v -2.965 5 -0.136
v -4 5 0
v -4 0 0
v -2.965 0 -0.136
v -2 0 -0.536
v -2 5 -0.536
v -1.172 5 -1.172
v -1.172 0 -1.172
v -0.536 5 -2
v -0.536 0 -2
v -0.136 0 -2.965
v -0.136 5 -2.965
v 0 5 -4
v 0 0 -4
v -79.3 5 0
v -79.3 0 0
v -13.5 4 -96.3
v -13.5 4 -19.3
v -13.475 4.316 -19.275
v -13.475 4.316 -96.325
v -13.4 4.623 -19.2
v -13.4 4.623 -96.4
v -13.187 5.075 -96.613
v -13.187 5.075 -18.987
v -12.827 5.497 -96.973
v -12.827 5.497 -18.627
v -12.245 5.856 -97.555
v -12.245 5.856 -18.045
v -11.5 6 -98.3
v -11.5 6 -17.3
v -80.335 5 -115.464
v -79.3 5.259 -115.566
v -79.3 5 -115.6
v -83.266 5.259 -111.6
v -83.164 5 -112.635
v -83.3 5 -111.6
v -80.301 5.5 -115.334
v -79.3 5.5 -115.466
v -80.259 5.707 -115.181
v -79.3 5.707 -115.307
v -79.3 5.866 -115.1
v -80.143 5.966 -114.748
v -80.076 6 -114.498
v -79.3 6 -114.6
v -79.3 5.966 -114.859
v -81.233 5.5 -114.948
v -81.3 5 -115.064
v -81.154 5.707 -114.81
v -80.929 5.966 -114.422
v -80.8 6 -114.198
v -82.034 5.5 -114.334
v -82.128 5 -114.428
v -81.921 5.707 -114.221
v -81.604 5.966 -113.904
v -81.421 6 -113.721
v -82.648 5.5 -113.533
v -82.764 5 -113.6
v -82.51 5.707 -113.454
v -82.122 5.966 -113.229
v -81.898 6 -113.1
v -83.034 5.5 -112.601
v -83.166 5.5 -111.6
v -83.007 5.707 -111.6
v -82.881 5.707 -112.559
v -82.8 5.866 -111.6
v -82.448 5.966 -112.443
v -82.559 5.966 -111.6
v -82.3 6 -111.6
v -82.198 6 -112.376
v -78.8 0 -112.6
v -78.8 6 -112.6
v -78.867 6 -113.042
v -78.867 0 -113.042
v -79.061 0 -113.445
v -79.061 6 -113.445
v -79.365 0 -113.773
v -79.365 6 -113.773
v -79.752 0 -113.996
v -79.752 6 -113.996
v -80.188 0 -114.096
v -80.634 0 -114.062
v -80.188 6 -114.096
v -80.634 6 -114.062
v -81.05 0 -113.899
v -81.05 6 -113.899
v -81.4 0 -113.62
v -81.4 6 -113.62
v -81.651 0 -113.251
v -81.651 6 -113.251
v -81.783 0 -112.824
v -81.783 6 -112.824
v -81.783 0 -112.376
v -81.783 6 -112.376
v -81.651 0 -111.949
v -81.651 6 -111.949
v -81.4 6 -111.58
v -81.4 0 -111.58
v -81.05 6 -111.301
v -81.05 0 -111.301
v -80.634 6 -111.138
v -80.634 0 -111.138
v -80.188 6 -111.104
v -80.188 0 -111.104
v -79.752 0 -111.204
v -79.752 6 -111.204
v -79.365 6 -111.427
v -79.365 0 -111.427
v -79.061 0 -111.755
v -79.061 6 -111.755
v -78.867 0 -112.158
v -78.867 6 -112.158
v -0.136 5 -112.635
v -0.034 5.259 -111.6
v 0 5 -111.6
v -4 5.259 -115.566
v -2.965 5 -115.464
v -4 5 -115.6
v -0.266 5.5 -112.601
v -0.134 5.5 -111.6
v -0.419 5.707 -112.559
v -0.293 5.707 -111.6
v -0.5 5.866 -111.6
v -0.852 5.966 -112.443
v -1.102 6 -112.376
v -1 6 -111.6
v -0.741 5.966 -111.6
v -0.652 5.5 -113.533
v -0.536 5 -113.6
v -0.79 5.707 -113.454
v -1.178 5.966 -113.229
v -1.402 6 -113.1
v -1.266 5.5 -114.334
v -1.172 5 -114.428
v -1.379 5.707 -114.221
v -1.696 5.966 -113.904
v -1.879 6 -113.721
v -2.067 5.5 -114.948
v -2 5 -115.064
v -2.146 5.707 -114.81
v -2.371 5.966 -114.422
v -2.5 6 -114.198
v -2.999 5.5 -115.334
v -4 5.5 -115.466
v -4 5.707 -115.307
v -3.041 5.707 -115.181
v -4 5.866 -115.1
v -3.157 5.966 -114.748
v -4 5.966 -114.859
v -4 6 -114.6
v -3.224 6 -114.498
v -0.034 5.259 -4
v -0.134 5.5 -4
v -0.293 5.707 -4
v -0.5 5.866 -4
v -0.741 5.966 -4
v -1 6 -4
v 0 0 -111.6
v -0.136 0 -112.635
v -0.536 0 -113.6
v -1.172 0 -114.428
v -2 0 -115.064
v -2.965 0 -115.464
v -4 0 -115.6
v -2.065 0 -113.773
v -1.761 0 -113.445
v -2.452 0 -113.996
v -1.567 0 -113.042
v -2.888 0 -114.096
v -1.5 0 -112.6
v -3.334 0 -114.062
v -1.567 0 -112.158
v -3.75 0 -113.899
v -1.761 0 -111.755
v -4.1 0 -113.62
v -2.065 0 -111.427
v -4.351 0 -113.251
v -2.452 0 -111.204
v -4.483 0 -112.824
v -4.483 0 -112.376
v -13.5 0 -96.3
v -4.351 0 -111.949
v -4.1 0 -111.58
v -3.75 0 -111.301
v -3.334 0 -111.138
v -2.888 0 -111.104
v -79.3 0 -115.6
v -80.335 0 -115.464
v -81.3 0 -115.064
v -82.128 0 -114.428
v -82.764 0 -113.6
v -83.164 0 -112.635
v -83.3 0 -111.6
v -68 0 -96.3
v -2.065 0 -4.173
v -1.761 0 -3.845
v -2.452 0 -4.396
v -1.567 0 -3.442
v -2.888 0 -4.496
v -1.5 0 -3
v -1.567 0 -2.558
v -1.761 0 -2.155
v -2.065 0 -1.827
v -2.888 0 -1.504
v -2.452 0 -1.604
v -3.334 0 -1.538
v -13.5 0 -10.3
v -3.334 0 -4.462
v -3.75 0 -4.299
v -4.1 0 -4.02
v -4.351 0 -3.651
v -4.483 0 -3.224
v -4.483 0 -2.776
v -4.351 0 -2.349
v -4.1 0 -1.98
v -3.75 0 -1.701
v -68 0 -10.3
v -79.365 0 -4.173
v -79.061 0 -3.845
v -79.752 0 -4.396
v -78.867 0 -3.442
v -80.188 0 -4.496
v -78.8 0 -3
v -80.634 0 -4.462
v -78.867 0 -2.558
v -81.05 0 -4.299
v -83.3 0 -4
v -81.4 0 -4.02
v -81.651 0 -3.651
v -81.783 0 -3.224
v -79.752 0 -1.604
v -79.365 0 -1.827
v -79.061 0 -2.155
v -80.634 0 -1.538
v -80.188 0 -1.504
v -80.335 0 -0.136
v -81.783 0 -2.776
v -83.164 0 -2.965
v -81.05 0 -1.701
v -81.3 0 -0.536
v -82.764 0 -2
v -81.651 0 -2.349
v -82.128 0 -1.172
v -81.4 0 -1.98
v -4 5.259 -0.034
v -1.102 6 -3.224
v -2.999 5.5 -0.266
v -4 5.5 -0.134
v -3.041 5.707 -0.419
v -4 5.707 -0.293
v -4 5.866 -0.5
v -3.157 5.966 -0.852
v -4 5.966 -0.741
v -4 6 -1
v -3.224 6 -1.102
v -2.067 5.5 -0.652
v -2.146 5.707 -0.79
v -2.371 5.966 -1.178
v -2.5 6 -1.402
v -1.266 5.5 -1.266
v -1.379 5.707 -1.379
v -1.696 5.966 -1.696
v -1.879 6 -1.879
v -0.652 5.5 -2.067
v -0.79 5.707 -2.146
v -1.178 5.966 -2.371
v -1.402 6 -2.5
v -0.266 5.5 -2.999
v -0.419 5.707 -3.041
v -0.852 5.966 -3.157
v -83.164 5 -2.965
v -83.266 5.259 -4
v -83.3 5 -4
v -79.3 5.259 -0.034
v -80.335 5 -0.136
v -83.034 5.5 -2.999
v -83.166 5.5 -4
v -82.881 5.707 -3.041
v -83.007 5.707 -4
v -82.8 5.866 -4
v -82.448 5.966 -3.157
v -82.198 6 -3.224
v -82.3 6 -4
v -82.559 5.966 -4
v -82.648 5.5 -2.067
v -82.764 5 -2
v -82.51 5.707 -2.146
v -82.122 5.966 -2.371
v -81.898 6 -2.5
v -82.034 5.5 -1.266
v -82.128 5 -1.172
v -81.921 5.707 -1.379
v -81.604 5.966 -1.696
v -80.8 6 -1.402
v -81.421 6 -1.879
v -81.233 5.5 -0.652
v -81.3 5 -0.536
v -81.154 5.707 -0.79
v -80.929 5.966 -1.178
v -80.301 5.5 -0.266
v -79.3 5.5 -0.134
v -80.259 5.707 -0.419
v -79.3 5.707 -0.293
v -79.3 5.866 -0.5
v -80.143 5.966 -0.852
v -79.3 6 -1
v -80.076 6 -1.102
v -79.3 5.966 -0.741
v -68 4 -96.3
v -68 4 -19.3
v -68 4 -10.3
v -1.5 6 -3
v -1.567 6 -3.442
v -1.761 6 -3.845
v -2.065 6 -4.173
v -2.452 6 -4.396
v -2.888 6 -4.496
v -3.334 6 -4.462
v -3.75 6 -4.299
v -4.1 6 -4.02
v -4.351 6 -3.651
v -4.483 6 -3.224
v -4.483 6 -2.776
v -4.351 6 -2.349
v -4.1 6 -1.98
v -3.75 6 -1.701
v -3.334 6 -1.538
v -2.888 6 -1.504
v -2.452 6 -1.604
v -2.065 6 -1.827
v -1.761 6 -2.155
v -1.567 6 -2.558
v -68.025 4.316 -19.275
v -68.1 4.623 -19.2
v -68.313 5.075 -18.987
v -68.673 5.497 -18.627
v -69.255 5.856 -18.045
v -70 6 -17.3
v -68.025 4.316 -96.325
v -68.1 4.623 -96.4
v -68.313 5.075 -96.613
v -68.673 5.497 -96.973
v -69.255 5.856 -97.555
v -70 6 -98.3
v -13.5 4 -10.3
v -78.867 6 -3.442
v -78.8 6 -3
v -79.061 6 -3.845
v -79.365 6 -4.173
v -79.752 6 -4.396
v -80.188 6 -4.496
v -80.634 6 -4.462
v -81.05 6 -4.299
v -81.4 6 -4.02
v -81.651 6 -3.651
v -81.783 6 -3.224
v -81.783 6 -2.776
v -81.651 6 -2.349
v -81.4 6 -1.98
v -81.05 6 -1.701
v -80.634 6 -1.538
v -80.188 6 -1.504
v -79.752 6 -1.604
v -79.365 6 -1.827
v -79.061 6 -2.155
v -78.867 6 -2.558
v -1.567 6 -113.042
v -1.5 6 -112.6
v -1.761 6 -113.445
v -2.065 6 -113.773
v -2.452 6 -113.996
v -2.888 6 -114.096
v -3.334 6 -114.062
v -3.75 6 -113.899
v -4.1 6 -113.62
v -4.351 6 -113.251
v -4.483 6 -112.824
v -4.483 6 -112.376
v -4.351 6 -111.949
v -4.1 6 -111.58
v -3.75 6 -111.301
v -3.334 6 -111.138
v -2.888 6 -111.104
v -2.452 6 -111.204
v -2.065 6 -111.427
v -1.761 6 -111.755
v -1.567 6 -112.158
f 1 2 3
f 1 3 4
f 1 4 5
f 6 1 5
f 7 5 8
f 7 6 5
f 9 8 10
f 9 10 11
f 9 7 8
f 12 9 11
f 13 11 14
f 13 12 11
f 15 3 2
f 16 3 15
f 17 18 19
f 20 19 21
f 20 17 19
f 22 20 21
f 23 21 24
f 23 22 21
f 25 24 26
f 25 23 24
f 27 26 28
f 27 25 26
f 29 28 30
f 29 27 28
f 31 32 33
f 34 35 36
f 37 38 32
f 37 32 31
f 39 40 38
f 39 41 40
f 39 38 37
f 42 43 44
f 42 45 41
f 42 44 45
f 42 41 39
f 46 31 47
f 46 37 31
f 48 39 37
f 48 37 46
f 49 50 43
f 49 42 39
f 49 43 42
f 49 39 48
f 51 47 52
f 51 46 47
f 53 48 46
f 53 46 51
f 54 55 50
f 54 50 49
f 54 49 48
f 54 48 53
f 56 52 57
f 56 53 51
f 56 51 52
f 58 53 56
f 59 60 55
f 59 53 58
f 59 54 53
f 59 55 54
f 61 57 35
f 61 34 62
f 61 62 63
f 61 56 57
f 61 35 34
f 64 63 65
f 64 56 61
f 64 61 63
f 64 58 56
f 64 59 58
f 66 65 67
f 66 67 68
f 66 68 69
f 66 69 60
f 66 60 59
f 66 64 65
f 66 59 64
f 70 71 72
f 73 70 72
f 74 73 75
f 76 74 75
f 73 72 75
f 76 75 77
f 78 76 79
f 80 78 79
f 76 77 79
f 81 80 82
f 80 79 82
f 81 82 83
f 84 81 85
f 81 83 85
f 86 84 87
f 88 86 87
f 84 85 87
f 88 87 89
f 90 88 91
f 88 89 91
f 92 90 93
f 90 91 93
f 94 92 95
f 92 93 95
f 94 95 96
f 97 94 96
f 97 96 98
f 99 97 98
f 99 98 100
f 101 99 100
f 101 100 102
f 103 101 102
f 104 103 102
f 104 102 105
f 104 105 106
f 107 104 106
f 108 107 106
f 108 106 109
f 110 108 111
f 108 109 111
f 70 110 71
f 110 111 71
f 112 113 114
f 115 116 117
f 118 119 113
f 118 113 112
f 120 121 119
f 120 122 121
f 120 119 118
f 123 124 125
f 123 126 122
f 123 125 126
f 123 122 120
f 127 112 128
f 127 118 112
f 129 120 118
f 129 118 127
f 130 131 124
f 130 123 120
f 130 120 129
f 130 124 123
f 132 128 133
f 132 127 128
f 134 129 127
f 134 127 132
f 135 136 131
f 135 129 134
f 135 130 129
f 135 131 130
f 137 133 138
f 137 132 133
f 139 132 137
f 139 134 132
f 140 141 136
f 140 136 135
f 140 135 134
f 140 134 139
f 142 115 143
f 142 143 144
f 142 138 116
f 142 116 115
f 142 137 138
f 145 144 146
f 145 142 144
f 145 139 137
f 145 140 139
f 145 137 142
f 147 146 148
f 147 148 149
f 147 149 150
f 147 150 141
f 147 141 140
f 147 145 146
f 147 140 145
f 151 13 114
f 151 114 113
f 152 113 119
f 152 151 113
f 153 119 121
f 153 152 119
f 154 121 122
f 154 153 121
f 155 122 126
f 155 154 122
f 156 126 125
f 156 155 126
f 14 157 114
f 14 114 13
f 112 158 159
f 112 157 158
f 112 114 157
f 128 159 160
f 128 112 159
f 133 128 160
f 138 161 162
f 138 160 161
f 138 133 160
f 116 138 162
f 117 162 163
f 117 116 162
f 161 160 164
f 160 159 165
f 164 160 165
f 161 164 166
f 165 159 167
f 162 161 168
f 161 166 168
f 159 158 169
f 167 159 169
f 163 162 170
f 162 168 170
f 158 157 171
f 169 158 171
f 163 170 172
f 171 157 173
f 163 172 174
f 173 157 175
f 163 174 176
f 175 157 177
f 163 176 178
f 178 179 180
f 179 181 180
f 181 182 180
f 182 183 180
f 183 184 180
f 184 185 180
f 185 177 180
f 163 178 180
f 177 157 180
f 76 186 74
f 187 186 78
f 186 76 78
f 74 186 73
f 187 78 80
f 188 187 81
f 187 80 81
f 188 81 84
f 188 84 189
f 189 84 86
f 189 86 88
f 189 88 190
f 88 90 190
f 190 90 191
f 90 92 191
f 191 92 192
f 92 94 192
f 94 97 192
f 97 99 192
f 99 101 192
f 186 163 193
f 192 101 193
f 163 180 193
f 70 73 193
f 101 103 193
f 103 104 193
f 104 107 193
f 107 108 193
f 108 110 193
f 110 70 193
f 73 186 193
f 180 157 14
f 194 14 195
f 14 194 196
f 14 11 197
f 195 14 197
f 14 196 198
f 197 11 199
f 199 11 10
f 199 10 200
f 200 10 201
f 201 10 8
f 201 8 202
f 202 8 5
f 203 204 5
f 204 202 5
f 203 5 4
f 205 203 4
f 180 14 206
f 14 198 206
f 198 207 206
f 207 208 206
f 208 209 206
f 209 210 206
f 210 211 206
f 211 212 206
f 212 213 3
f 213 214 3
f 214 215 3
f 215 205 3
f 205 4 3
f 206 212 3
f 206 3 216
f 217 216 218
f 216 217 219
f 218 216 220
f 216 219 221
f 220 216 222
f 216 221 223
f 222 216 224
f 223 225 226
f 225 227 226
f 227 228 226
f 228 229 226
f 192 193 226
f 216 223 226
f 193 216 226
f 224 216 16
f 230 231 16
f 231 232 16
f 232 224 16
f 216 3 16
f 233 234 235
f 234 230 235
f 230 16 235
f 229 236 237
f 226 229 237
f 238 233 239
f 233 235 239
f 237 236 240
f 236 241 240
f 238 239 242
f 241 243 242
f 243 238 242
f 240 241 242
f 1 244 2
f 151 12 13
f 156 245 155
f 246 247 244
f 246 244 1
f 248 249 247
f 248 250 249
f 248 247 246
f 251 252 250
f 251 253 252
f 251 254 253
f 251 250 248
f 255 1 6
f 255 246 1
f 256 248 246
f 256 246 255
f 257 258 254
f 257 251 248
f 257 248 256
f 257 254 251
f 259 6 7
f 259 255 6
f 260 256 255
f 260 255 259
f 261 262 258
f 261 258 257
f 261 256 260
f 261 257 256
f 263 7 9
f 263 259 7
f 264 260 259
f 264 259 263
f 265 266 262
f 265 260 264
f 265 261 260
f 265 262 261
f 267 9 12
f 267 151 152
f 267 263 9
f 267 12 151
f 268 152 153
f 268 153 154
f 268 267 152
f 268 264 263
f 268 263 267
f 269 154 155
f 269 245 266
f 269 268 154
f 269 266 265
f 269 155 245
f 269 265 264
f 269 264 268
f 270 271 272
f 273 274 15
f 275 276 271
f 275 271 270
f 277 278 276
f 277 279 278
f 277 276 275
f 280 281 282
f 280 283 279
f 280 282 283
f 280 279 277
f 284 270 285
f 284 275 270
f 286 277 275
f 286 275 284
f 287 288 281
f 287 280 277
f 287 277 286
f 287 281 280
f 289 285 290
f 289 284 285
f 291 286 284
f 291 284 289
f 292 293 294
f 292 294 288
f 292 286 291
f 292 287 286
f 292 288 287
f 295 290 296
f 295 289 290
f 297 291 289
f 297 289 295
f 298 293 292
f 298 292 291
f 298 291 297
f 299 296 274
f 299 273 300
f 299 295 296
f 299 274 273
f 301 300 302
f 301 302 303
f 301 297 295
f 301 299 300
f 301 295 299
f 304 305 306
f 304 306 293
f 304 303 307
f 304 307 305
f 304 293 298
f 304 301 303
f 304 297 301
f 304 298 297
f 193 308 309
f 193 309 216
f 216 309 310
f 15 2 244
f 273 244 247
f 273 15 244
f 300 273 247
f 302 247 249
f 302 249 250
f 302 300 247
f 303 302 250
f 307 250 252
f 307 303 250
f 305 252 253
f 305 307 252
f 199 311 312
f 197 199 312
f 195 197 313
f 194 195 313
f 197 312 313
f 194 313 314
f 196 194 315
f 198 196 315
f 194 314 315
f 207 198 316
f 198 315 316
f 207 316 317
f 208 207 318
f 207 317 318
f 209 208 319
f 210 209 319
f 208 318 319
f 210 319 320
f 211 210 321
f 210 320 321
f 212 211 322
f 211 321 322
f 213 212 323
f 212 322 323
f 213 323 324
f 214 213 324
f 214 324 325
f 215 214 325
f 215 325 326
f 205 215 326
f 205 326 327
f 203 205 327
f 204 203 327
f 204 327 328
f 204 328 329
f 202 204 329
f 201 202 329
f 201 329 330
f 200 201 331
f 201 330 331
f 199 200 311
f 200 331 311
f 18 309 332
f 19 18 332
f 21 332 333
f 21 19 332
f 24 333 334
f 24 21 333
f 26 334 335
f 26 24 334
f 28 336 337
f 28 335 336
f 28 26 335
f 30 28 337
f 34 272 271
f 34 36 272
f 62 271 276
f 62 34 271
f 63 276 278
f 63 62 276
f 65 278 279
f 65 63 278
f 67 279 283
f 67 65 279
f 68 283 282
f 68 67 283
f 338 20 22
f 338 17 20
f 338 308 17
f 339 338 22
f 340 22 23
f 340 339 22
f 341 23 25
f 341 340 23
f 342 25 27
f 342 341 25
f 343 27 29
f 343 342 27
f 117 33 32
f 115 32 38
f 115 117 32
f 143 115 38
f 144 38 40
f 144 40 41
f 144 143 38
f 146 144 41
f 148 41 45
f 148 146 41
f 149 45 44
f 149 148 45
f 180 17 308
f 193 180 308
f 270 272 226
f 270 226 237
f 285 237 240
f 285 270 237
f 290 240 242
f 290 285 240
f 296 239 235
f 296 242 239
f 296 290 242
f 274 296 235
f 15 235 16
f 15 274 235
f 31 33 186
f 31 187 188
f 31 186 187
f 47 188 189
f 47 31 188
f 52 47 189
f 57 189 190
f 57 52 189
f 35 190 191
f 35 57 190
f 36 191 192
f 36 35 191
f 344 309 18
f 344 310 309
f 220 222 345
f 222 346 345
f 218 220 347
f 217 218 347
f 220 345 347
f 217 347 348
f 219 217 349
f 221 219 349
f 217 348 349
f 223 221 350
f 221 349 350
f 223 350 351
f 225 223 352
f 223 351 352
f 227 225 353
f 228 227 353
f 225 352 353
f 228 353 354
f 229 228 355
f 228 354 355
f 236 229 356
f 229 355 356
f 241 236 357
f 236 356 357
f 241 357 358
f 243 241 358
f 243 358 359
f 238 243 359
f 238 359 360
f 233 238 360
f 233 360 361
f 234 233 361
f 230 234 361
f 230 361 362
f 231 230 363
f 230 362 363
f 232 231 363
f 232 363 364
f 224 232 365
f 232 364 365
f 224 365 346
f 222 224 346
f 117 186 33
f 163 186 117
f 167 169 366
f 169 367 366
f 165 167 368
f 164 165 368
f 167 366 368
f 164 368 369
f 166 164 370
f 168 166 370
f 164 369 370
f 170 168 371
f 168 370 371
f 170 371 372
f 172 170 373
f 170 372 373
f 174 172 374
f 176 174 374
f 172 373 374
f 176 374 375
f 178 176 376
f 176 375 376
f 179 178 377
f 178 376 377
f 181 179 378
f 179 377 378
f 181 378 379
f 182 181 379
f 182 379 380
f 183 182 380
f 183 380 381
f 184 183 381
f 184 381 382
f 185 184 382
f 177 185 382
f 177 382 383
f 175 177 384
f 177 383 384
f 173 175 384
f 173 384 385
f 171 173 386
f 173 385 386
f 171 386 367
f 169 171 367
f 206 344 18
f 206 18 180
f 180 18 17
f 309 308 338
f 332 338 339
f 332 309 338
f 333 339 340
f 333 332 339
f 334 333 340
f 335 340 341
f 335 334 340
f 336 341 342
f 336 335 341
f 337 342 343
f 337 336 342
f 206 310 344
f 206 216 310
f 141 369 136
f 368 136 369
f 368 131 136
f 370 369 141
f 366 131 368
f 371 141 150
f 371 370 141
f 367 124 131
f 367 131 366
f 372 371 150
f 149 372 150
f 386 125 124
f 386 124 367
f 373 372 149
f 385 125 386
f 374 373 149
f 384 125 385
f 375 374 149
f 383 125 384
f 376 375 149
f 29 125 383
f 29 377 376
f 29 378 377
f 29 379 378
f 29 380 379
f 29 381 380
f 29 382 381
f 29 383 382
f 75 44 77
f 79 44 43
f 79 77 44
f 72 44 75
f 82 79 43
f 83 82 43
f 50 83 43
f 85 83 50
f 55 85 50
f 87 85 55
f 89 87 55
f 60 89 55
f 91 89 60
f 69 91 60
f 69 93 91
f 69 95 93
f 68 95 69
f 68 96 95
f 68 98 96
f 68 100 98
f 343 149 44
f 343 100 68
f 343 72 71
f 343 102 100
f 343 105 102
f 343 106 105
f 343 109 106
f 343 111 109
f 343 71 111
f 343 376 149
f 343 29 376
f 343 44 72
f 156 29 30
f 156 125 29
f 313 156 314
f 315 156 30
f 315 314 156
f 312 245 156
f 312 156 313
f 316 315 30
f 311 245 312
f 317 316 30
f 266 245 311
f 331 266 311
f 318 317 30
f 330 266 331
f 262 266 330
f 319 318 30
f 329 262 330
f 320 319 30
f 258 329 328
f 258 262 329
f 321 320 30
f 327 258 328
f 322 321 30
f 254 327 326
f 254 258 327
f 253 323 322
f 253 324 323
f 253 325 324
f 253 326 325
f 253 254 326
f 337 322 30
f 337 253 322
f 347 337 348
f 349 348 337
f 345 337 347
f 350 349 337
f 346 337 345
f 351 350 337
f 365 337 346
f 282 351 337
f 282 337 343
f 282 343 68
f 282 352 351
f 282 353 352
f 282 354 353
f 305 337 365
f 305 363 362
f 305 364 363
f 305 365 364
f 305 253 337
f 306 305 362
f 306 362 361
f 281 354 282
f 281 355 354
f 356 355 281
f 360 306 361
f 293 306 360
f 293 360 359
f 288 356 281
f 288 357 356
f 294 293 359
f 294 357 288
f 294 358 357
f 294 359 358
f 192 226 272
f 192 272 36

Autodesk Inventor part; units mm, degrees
ref_plane "YZ Plane" through (0, 0, 0) normal (1, 0, 0) x (0, 1, 0)
ref_plane "XZ Plane" through (0, 0, 0) normal (0, 1, 0) x (-1, 0, 0)
ref_plane "XY Plane" through (0, 0, 0) normal (0, 0, 1) x (1, 0, 0)
sketch "Sketch1" plane through (0, 0, 0) normal (0, 1, 0) x (-1, 0, 0)
  line L0 (0, 0) -> (83.3, 0)
  line L1 (83.3, 0) -> (83.3, -115.6)
  line L2 (83.3, -115.6) -> (0, -115.6)
  line L3 (0, -115.6) -> (0, 0)
  dimension "d0" = 115.6
  dimension "d1" = 83.3
extrude "Lid Body" add sketch "Sketch1" along normal blind 6
fillet "4mm Fillet" radius 4 4 edges at (0, 3, -115.6) (-83.3, 3, -115.6) (-83.3, 3, 0) (0, 3, 0)
sketch "Sketch2" plane through (0, 6, 0) normal (0, 1, 0) x (1, 0, 0)
  circle A0 centre (-80.3, 3) radius 1.5
  line L0 (-83.3, 115.6) -> (-83.3, 0) projected
  line L1 (-83.3, 0) -> (0, 0) projected
  line L2 (-83.3, 57.8) -> (0, 57.8)
  line L3 (0, 0) -> (0, 115.6) projected
  line L4 (-41.65, 0) -> (-41.65, 124)
  circle A1 centre (-80.3, 112.6) radius 1.5
  circle A2 centre (-3, 3) radius 1.5
  circle A3 centre (-3, 112.6) radius 1.5
  dimension "d5" = 3
  dimension "d6" = 3
  dimension "d7" = 3
extrude "3mm Mounting Holes" cut sketch "Sketch2" against normal through all contours A0 | A1 | A2 | A3
sketch "Sketch3" plane through (0, 6, 0) normal (0, 1, 0) x (1, 0, 0)
  line L0 (-83.3, 0) -> (0, 0) projected
  line L1 (0, 0) -> (0, 115.6) projected
  line L2 (0, 115.6) -> (-83.3, 115.6) projected
  line L3 (-83.3, 115.6) -> (-83.3, 0) projected
  line L4 (-78.3, 5) -> (-5, 5)
  line L5 (-5, 5) -> (-5, 110.6)
  line L6 (-5, 110.6) -> (-78.3, 110.6)
  line L7 (-78.3, 110.6) -> (-78.3, 5)
  line L8 (-68, 19.3) -> (-13.5, 19.3)
  line L9 (-13.5, 19.3) -> (-13.5, 96.3)
  line L10 (-13.5, 96.3) -> (-68, 96.3)
  line L11 (-68, 96.3) -> (-68, 19.3)
  dimension "d11" = 5
  dimension "d12" = 54.5
  dimension "d13" = 77
  dimension "d14" = 10.3
  dimension "d18" = 14.3
extrude "Screen Cut-Out" cut sketch "Sketch3" against normal through all contours L11 L10 L9 L8
fillet "Fillet3" radius 1 8 edges at (-82.1284, 6, -1.1716) (-41.65, 6, 0) (-1.1716, 6, -1.1716) (0, 6, -57.8) (-1.1716, 6, -114.4284) (-41.65, 6, -115.6) (-82.1284, 6, -114.4284) (-83.3, 6, -57.8)
fillet "Fillet4" radius 2 4 edges at (-40.75, 6, -19.3) (-68, 6, -57.8) (-40.75, 6, -96.3) (-13.5, 6, -57.8)
sketch "Sketch4" plane through (0, 0, 0) normal (0, -1, 0) x (1, 0, 0)
  line L0 (-68, -19.3) -> (-13.5, -19.3) projected
  line L1 (-13.5, -19.3) -> (-68, -19.3)
  line L2 (-68, -19.3) -> (-68, -10.3)
  line L3 (-68, -10.3) -> (-13.5, -10.3)
  line L4 (-13.5, -10.3) -> (-13.5, -19.3)
  point P0 (0, 0)
  dimension "d21" = 9
extrude "Extrusion4" cut sketch "Sketch4" against normal blind 4
properties part number "LidTest02"
